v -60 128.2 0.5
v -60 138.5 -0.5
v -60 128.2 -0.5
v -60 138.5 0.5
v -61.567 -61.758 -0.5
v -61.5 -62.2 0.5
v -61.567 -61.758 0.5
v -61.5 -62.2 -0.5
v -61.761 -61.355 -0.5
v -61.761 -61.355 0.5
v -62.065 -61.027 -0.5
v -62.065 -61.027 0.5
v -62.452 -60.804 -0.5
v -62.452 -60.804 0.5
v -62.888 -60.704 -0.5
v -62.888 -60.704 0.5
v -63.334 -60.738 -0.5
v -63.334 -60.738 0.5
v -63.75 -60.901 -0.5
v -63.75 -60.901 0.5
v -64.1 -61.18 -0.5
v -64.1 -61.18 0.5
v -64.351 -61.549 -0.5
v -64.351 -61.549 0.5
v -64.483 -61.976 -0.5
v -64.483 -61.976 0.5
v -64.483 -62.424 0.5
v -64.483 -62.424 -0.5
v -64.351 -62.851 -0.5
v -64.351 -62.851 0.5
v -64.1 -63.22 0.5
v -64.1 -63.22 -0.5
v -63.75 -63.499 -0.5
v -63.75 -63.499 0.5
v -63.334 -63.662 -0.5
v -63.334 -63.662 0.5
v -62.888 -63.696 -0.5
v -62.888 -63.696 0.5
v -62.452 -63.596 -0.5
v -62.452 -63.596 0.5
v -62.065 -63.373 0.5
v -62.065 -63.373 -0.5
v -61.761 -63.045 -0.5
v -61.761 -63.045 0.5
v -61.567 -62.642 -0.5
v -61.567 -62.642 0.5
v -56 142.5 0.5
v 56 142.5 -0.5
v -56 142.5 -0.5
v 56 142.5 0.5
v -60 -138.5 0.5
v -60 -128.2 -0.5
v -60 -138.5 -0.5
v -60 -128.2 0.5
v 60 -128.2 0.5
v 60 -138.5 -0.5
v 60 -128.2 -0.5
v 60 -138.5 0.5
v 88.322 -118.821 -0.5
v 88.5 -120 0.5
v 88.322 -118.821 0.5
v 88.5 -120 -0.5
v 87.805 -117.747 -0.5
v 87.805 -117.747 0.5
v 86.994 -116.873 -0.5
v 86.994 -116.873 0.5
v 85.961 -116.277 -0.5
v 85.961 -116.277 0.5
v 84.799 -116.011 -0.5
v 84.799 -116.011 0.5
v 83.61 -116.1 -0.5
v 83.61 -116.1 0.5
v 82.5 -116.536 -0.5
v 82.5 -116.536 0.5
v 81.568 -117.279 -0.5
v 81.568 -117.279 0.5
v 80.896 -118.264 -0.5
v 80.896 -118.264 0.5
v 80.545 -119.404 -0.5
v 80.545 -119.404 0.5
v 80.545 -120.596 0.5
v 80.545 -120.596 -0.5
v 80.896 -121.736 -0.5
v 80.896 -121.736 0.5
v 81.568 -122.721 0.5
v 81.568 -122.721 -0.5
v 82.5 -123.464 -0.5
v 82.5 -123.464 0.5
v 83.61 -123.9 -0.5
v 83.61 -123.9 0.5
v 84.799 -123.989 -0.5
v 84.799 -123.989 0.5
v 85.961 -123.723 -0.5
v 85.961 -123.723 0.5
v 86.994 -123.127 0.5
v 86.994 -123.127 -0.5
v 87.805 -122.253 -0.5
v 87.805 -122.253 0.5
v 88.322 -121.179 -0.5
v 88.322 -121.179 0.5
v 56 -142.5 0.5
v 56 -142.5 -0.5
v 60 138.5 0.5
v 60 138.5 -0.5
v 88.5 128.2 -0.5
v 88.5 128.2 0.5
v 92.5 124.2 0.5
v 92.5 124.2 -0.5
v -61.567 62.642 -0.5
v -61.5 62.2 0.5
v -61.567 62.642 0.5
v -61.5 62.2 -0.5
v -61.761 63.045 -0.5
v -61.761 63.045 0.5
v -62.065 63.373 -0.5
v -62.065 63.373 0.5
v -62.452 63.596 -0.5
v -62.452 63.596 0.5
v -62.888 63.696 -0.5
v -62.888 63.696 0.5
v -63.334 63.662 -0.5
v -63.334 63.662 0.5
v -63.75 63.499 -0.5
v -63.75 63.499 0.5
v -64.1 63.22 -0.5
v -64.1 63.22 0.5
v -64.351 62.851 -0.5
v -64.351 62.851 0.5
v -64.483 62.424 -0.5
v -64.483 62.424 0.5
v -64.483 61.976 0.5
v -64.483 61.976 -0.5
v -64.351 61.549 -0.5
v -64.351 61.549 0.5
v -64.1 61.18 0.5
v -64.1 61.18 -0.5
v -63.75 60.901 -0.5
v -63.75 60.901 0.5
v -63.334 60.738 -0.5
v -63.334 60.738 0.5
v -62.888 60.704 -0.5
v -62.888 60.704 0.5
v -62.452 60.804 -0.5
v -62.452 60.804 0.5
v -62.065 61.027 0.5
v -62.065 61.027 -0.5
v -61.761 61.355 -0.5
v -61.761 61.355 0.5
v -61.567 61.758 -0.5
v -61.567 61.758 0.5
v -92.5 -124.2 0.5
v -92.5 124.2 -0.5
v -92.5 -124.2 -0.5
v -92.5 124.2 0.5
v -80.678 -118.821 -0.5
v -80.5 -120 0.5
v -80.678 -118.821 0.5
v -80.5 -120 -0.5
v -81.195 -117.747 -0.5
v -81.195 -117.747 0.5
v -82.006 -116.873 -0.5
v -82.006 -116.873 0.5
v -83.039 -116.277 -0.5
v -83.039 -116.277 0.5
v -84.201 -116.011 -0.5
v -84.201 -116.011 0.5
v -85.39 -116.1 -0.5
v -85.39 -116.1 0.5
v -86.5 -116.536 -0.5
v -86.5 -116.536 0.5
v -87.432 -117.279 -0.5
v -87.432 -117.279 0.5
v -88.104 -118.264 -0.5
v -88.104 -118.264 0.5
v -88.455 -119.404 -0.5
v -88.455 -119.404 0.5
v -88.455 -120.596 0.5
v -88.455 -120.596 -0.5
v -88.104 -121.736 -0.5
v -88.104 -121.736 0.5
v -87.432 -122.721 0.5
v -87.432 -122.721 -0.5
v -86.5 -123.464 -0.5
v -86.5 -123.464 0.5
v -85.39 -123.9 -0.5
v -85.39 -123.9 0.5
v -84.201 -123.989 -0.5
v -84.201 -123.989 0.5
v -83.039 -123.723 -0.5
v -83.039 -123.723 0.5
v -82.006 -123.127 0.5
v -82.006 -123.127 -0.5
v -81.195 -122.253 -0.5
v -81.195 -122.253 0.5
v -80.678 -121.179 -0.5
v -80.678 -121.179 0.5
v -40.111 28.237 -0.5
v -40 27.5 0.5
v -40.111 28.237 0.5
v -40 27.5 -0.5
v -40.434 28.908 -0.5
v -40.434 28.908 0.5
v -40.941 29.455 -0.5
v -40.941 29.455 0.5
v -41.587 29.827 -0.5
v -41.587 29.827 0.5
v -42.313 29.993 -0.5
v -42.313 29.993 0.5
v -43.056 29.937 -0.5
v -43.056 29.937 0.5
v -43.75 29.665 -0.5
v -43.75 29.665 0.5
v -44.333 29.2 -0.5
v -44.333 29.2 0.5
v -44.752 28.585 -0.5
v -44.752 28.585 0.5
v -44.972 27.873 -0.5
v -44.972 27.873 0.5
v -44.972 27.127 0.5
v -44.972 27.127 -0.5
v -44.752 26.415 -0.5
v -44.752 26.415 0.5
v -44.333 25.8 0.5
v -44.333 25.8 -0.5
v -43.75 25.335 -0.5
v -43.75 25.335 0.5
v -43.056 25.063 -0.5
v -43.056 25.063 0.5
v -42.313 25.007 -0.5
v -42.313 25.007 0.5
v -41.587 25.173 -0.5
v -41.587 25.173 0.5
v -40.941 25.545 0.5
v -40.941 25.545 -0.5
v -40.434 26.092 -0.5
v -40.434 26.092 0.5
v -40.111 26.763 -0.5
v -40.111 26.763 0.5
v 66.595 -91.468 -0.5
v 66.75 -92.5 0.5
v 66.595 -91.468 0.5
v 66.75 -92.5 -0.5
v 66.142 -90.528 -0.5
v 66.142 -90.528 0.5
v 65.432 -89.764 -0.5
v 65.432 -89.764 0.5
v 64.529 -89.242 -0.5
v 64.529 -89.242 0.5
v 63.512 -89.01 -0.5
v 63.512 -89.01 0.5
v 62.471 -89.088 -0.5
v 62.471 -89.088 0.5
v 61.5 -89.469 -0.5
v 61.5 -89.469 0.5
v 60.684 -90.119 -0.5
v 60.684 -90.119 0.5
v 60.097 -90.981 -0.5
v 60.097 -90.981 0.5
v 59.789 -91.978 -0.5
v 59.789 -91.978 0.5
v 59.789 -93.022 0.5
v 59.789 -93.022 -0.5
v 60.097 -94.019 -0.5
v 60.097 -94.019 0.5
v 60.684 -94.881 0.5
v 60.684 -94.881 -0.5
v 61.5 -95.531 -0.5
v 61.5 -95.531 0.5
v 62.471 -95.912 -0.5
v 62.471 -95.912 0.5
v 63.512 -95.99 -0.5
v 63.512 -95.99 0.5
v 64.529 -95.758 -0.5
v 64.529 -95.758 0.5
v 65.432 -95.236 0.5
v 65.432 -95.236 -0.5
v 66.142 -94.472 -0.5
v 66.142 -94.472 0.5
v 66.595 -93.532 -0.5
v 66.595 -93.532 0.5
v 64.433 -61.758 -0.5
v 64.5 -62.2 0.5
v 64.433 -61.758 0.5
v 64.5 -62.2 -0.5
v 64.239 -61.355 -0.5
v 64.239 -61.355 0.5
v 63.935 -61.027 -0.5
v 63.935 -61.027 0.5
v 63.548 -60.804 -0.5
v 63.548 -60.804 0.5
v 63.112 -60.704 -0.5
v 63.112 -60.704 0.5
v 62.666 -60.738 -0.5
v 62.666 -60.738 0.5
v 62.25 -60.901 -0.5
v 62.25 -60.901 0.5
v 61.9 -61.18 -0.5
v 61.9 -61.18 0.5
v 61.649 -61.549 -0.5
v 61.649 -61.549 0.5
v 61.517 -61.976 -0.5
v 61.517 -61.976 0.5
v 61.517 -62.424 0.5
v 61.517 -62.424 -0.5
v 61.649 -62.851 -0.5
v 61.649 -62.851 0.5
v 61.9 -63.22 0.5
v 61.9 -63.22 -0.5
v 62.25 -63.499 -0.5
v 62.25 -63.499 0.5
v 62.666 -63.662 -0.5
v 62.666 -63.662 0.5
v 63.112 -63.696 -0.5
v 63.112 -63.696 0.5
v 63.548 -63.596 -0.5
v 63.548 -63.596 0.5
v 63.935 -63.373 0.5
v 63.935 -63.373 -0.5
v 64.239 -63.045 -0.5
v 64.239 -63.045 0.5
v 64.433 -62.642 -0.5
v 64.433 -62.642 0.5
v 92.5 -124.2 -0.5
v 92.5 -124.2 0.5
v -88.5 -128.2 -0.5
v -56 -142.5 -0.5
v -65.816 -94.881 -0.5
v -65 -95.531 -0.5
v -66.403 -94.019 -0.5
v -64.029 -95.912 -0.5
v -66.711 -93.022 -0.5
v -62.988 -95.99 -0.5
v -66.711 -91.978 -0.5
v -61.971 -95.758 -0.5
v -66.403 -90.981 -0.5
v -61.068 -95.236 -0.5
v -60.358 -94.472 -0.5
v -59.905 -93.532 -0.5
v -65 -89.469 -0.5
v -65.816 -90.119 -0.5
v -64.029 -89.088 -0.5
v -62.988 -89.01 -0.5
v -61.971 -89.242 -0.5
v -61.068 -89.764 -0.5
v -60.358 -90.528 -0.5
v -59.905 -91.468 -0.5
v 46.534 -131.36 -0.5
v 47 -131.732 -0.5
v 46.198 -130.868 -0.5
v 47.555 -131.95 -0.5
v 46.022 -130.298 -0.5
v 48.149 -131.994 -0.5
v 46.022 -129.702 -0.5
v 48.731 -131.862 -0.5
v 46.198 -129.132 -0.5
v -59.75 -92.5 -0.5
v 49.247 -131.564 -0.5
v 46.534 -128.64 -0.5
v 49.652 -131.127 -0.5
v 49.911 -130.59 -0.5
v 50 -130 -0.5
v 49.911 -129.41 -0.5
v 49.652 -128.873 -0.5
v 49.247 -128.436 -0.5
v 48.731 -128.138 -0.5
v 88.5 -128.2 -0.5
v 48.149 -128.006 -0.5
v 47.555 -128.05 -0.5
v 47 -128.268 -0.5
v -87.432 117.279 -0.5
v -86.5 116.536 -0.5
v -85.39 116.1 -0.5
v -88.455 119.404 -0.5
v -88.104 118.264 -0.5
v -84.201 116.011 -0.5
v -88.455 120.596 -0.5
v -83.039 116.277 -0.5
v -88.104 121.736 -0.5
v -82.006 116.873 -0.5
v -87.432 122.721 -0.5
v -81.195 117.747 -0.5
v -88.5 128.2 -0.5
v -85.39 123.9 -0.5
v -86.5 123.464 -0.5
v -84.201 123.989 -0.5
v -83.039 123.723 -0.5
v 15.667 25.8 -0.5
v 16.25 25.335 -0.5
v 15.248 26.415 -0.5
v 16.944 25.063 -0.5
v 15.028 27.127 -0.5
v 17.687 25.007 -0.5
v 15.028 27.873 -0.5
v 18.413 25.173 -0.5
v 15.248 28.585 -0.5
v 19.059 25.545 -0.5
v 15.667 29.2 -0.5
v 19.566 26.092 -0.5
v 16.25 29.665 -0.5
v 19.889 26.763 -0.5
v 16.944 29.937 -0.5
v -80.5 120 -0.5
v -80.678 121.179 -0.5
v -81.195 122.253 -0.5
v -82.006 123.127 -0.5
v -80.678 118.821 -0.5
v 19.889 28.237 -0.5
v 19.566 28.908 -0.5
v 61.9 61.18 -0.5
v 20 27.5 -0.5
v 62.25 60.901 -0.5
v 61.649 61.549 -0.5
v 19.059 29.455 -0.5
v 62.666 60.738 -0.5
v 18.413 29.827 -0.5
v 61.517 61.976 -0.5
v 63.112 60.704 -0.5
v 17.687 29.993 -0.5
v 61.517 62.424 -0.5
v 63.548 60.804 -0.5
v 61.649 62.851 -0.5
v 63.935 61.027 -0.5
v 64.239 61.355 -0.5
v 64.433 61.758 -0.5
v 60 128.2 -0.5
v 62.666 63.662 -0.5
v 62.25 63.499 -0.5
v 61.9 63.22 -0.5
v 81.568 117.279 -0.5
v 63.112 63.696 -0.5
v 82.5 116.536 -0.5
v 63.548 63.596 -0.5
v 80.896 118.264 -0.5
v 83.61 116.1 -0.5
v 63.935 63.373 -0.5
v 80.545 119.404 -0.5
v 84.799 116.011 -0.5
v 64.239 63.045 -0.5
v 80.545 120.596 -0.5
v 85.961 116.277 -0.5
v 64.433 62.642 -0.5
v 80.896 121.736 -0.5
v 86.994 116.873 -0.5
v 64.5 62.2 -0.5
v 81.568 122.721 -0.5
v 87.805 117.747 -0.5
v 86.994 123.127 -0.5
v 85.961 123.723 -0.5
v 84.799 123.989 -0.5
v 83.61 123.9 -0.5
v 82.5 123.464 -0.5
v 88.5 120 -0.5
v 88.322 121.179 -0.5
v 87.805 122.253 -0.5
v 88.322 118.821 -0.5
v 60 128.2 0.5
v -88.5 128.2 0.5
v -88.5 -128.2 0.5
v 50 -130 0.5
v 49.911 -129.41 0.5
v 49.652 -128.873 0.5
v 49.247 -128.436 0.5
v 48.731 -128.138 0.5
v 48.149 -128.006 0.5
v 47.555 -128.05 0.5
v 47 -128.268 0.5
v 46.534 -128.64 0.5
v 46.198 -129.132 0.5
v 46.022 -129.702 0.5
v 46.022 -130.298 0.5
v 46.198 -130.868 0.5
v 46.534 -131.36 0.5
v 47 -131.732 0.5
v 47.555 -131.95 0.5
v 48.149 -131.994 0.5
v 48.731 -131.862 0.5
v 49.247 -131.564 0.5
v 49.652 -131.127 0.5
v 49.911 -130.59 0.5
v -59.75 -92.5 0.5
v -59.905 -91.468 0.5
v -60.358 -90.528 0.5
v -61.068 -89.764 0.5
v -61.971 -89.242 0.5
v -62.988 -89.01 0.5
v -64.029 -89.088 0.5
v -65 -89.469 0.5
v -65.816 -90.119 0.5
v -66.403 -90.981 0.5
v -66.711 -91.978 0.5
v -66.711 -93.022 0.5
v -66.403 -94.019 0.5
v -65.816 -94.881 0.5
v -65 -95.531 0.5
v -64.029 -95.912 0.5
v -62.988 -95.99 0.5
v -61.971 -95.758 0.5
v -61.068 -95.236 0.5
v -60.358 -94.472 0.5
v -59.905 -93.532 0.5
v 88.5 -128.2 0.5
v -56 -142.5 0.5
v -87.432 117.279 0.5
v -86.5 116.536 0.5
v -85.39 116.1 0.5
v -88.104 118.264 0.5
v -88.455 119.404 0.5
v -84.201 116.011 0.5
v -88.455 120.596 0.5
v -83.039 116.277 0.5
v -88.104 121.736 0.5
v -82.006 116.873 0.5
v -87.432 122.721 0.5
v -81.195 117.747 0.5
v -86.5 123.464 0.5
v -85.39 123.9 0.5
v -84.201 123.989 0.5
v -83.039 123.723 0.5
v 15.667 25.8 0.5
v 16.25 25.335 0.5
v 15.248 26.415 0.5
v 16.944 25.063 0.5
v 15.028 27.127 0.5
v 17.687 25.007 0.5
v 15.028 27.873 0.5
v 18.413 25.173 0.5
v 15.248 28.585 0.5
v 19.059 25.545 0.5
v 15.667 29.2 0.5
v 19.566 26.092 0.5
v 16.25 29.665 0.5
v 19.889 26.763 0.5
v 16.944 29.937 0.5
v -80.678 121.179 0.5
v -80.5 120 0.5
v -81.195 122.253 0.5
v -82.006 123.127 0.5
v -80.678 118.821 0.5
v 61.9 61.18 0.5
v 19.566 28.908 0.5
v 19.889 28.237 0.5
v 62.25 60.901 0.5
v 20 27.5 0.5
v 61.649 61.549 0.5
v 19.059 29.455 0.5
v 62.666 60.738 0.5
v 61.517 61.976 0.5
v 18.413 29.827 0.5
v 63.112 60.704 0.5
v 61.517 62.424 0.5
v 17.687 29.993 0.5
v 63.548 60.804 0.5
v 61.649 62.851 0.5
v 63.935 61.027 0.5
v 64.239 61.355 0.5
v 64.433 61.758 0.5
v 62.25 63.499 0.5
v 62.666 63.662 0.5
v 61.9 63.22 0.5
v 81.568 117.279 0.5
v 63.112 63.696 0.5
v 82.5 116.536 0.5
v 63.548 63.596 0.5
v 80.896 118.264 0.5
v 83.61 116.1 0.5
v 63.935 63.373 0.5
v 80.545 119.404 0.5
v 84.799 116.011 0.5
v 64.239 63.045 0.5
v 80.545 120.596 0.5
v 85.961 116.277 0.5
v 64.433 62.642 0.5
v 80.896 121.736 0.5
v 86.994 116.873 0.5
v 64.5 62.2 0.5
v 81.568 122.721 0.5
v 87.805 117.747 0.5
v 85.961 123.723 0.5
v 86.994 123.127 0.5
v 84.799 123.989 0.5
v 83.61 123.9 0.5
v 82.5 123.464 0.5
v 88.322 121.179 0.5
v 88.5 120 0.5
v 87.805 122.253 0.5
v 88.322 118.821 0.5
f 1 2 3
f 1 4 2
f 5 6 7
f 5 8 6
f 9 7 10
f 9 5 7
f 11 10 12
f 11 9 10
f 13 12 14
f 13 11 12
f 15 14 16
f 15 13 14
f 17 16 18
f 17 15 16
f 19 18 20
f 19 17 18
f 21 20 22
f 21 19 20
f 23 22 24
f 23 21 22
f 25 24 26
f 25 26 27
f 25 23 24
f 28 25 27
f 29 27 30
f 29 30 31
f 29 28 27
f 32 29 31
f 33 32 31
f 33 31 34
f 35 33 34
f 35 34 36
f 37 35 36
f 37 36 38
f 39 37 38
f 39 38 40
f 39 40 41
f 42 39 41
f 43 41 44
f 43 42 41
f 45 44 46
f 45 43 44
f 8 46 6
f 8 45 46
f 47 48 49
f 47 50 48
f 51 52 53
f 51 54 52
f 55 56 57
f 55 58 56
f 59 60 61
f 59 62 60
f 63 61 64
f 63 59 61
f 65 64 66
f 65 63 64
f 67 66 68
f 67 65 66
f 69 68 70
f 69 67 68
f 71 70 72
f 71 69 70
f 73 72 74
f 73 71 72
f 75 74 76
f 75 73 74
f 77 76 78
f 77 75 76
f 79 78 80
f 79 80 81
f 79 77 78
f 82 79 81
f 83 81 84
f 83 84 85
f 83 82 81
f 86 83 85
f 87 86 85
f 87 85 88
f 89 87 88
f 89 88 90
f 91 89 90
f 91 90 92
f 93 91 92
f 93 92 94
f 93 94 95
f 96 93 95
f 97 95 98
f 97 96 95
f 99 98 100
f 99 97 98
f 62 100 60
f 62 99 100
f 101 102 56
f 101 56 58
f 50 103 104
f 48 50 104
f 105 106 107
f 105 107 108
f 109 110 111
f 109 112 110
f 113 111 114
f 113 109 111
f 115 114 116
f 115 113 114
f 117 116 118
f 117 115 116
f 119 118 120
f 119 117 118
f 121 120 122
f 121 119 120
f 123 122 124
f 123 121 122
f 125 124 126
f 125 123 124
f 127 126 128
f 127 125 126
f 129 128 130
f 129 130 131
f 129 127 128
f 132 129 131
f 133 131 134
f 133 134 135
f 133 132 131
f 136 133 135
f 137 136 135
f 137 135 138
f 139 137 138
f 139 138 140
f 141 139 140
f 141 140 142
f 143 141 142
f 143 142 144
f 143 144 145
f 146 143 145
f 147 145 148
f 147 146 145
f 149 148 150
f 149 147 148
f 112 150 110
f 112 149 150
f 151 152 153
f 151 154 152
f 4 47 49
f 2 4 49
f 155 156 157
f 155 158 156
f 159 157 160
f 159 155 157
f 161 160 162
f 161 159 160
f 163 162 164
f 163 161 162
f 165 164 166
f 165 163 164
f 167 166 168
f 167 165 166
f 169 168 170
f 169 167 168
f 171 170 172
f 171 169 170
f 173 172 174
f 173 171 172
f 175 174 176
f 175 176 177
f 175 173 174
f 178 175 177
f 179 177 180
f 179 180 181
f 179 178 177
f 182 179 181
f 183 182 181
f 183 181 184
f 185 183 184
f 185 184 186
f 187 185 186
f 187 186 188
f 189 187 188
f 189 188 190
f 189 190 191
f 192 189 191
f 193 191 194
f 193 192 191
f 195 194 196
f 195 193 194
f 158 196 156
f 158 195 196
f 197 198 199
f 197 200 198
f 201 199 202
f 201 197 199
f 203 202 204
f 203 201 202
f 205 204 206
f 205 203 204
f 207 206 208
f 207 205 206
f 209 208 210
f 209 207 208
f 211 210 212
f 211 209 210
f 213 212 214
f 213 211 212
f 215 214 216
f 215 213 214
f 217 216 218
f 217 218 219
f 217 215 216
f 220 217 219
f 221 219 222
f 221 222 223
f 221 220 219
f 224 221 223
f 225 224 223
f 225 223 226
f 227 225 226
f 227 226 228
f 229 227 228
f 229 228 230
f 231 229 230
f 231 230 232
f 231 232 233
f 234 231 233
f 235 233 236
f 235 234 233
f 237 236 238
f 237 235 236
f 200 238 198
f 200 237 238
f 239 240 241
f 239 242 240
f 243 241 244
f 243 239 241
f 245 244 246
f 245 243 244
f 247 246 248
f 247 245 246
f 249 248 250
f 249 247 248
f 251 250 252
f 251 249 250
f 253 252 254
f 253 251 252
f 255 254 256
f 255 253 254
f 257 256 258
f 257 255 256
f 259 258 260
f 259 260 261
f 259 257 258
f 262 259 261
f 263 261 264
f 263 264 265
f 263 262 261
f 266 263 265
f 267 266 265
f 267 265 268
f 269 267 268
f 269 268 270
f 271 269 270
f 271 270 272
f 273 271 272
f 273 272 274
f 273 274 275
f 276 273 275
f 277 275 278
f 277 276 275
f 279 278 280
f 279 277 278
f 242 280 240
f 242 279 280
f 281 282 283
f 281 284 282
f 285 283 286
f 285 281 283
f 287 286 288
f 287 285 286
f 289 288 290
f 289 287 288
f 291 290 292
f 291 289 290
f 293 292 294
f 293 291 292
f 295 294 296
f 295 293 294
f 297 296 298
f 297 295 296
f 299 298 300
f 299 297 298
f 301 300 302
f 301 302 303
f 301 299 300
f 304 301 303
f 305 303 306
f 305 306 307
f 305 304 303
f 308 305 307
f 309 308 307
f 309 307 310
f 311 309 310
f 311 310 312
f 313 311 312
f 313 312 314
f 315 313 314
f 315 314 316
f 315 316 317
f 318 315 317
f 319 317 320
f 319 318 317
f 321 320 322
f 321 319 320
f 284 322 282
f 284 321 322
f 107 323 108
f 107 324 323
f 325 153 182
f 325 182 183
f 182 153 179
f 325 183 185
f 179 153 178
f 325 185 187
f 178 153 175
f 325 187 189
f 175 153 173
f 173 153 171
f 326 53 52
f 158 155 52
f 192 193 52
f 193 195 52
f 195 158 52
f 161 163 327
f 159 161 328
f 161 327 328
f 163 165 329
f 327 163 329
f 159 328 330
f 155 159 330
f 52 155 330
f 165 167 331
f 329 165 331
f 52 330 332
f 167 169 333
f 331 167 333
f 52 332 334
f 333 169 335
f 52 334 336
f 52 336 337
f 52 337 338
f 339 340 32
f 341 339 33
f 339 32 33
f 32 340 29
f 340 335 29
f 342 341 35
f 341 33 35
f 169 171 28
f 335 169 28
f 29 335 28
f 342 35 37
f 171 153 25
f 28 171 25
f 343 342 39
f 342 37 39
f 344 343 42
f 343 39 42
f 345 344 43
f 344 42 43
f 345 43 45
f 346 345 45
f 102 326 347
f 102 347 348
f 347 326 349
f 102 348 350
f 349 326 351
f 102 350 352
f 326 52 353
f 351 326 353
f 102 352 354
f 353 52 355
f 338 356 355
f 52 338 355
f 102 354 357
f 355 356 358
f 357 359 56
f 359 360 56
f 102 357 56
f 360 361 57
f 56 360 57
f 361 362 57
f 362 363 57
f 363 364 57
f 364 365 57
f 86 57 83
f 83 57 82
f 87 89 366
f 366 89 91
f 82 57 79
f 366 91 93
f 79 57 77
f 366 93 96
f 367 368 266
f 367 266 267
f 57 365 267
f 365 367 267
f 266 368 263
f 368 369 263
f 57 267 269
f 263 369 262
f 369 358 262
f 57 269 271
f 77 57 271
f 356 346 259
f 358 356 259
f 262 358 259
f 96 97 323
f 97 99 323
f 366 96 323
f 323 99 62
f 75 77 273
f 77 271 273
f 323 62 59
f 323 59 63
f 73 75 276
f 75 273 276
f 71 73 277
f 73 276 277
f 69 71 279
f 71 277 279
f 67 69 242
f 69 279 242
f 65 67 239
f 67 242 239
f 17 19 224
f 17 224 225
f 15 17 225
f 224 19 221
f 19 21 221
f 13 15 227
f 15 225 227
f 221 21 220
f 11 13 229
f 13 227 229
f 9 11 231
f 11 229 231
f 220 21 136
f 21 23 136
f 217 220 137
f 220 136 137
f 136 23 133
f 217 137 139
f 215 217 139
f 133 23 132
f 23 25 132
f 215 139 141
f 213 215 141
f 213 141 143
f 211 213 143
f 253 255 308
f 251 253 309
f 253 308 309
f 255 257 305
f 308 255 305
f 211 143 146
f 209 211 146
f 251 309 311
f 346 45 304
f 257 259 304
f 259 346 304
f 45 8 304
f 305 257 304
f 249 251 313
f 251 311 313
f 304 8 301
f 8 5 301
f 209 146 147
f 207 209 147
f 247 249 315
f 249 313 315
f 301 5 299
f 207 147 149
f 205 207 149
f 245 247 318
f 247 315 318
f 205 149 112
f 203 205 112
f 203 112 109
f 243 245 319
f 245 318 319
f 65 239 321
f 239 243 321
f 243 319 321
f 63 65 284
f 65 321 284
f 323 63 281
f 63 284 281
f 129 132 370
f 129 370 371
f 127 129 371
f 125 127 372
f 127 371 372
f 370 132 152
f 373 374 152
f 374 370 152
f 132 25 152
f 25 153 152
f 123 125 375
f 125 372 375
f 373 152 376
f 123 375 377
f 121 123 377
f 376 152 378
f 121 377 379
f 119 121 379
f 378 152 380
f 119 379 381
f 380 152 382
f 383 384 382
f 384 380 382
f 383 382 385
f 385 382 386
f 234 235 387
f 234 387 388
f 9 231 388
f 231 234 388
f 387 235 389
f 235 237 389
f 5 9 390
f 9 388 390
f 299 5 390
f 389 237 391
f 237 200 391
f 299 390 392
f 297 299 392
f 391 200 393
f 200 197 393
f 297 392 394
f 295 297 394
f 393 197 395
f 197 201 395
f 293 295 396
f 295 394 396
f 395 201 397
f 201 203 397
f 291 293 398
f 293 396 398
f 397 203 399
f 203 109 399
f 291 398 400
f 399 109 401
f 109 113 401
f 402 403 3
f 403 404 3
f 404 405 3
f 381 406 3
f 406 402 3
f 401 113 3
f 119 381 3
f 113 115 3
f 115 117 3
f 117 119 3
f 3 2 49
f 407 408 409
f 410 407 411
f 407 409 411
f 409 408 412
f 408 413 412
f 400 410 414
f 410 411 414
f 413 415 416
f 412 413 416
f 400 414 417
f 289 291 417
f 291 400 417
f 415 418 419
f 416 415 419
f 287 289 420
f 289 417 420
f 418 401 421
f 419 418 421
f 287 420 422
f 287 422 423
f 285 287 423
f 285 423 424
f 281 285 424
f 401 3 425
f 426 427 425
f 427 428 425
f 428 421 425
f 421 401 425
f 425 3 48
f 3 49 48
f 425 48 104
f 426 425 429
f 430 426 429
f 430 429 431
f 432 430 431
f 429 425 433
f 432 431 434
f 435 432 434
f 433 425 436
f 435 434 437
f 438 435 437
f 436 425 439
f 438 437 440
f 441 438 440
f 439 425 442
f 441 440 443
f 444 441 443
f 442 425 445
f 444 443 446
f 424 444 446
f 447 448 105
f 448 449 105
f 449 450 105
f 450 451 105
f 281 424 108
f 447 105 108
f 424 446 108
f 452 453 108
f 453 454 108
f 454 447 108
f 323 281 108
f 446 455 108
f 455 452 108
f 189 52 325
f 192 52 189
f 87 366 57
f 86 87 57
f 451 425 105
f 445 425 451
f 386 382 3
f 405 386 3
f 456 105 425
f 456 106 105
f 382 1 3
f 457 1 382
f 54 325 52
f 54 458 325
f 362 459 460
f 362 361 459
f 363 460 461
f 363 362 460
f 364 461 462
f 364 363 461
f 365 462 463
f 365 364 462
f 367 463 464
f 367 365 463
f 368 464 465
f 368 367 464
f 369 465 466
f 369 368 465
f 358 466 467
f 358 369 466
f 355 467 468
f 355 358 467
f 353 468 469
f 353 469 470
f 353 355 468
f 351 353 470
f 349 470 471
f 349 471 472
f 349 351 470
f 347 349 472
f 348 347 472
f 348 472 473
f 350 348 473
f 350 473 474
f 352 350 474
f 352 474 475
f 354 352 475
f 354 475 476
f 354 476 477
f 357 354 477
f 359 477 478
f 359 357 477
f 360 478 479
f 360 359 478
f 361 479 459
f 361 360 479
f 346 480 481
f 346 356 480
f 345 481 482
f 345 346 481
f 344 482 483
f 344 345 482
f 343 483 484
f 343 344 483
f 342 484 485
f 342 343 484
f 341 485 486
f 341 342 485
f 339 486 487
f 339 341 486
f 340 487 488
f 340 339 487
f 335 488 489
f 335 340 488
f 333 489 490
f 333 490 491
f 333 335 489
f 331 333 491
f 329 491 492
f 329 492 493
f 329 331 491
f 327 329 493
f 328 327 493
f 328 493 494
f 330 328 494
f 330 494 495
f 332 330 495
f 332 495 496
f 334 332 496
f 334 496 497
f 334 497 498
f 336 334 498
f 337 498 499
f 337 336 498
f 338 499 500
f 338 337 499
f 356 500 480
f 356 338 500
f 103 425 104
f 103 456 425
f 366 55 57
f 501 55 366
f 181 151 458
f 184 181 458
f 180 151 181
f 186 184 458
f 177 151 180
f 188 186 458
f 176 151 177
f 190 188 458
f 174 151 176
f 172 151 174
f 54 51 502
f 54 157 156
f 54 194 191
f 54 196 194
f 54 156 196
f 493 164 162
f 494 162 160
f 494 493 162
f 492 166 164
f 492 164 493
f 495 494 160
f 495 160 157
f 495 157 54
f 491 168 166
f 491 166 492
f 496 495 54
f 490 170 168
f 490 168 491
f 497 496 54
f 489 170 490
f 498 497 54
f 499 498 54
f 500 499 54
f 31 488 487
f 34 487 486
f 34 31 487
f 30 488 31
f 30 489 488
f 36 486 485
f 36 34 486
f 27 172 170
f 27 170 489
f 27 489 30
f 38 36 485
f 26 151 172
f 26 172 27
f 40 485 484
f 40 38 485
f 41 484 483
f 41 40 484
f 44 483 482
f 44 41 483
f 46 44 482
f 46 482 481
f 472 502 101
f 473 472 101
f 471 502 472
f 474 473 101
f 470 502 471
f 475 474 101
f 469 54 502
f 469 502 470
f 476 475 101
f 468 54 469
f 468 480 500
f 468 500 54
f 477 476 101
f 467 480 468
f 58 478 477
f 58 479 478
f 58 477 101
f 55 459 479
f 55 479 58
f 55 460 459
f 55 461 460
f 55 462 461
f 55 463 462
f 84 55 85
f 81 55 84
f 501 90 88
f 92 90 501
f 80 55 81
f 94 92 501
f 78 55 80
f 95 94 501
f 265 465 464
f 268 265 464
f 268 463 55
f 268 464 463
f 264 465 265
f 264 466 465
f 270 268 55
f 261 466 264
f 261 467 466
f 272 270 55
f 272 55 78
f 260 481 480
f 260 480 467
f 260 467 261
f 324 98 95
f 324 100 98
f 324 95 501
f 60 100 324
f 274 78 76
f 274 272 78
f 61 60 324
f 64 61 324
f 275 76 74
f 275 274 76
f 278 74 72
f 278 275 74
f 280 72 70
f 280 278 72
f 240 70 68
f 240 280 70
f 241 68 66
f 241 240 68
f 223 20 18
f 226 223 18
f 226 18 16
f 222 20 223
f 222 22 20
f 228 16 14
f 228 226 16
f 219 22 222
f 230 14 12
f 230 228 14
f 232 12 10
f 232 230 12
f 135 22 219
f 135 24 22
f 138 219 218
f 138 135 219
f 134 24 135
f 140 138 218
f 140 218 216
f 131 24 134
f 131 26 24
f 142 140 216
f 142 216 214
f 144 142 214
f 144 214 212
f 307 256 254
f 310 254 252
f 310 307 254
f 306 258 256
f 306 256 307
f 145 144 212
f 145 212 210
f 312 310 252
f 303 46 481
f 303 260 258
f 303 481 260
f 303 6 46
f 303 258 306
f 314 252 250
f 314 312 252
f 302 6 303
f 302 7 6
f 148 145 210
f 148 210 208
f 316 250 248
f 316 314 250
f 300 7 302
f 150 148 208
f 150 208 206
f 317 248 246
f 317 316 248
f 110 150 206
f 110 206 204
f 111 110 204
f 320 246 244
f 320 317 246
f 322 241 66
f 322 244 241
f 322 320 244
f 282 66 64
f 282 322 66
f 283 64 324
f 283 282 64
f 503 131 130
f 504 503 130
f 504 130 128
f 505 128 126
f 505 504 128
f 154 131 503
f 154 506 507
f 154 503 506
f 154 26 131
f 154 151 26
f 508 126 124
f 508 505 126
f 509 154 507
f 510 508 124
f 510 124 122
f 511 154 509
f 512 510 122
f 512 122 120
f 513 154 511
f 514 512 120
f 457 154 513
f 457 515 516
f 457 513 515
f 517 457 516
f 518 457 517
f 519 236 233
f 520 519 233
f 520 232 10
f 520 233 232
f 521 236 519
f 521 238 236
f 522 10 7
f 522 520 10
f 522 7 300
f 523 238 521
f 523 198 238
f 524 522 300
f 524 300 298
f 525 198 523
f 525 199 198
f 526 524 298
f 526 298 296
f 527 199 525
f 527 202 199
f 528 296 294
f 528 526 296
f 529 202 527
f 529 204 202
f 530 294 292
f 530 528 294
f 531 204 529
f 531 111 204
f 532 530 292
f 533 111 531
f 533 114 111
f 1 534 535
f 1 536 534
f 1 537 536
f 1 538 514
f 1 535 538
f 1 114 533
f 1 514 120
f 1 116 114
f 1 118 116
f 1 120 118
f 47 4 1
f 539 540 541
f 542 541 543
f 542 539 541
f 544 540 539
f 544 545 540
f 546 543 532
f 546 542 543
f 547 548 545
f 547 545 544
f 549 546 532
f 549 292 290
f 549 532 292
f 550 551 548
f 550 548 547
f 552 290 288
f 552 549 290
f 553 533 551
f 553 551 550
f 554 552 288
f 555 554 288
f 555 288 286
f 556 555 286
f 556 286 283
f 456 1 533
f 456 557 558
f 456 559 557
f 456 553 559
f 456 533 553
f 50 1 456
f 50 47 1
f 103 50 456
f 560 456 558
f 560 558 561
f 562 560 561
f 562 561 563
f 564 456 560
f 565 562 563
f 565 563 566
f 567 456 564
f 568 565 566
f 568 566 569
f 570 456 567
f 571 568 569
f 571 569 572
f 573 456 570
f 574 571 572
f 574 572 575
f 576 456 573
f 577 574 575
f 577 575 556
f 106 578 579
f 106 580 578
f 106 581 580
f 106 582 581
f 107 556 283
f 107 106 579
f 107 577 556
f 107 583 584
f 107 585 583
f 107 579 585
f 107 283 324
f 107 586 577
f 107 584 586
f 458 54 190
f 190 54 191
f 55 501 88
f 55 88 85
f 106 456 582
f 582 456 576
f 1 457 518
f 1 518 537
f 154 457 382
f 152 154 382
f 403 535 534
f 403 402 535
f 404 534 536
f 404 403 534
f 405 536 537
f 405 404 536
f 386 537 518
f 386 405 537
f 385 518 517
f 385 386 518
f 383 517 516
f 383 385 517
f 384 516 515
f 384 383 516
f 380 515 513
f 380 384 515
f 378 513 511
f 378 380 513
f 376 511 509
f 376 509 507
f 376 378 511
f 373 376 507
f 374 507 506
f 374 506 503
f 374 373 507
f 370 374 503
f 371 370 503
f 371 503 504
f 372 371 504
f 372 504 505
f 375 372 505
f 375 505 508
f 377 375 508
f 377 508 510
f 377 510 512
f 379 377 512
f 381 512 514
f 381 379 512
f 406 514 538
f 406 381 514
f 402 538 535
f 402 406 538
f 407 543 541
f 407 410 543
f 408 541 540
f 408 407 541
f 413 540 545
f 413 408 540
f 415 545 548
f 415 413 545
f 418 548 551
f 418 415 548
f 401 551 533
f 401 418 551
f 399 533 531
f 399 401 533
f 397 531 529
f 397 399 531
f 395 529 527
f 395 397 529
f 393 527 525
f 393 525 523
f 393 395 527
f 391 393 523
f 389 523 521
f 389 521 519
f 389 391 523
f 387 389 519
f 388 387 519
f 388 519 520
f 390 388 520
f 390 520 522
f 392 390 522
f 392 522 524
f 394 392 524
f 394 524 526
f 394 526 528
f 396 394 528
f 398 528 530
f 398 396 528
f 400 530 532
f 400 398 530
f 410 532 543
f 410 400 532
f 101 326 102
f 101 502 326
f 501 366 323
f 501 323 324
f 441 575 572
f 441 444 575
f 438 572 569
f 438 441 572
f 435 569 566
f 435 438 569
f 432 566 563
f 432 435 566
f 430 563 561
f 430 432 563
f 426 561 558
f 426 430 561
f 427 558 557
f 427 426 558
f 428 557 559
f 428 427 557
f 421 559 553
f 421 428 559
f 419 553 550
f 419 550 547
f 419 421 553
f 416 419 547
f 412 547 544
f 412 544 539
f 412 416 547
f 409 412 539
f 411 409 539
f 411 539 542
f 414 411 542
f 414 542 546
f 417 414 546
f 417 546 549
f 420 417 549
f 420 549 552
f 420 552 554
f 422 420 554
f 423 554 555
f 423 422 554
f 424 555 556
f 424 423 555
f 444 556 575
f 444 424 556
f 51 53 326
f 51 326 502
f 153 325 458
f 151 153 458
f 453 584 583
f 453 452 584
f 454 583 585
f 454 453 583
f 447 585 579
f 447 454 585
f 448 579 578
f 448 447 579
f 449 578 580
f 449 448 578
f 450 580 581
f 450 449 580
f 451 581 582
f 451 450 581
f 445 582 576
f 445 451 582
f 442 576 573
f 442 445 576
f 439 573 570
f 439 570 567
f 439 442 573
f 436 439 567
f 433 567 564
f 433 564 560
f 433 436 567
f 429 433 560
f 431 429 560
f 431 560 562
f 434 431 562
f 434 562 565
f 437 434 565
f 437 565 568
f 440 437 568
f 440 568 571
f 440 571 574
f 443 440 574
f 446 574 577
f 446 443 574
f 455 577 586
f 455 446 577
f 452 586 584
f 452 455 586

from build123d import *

# Parameters (mm, degrees)
F0_R     = 4
F0_R_2   = 3.5
F0_R_3   = 1.5
F0_R_4   = 2
F0_R_5   = 2.5
F1_DEPTH = 0.5
F2_SIZE  = 4


with BuildPart() as f1:
    # F0 (on Top) → F1 (new body, symmetric)
    with BuildSketch(Plane.XY):
        Polygon((-92.5, 128.2), (-92.5, 0), (-92.5, -128.2), (-60, -128.2), (-60, -142.5), (0, -142.5), (60, -142.5), (60, -128.2), (92.5, -128.2), (92.5, 0), (92.5, 128.2), (60, 128.2), (60, 142.5), (0, 142.5), (-60, 142.5), (-60, 128.2), align=None)
        with Locations((-84.5, -120)):
            Circle(F0_R, mode=Mode.SUBTRACT)
        with Locations((-63.25, -92.5)):
            Circle(F0_R_2, mode=Mode.SUBTRACT)
        with Locations((-63, -62.2)):
            Circle(F0_R_3, mode=Mode.SUBTRACT)
        with Locations((48, -130)):
            Circle(F0_R_4, mode=Mode.SUBTRACT)
        with Locations((84.5, -120)):
            Circle(F0_R, mode=Mode.SUBTRACT)
        with Locations((63.25, -92.5)):
            Circle(F0_R_2, mode=Mode.SUBTRACT)
        with Locations((63, -62.2)):
            Circle(F0_R_3, mode=Mode.SUBTRACT)
        with Locations((-63, 62.2)):
            Circle(F0_R_3, mode=Mode.SUBTRACT)
        with Locations((-42.5, 27.5)):
            Circle(F0_R_5, mode=Mode.SUBTRACT)
        with Locations((-84.5, 120)):
            Circle(F0_R, mode=Mode.SUBTRACT)
        with Locations((17.5, 27.5)):
            Circle(F0_R_5, mode=Mode.SUBTRACT)
        with Locations((63, 62.2)):
            Circle(F0_R_3, mode=Mode.SUBTRACT)
        with Locations((84.5, 120)):
            Circle(F0_R, mode=Mode.SUBTRACT)
    extrude(amount=F1_DEPTH, both=True)

    # F2
    f2_edges = [f1.edges().sort_by_distance(p)[0] for p in [
        (-92.5, 128.2, 0),
        (-60, 142.5, 0),
        (60, 142.5, 0),
        (92.5, 128.2, 0),
        (92.5, -128.2, 0),
        (60, -142.5, 0),
        (-60, -142.5, 0),
        (-92.5, -128.2, 0),
    ]]
    chamfer(f2_edges, length=F2_SIZE)


solid = f1.part
